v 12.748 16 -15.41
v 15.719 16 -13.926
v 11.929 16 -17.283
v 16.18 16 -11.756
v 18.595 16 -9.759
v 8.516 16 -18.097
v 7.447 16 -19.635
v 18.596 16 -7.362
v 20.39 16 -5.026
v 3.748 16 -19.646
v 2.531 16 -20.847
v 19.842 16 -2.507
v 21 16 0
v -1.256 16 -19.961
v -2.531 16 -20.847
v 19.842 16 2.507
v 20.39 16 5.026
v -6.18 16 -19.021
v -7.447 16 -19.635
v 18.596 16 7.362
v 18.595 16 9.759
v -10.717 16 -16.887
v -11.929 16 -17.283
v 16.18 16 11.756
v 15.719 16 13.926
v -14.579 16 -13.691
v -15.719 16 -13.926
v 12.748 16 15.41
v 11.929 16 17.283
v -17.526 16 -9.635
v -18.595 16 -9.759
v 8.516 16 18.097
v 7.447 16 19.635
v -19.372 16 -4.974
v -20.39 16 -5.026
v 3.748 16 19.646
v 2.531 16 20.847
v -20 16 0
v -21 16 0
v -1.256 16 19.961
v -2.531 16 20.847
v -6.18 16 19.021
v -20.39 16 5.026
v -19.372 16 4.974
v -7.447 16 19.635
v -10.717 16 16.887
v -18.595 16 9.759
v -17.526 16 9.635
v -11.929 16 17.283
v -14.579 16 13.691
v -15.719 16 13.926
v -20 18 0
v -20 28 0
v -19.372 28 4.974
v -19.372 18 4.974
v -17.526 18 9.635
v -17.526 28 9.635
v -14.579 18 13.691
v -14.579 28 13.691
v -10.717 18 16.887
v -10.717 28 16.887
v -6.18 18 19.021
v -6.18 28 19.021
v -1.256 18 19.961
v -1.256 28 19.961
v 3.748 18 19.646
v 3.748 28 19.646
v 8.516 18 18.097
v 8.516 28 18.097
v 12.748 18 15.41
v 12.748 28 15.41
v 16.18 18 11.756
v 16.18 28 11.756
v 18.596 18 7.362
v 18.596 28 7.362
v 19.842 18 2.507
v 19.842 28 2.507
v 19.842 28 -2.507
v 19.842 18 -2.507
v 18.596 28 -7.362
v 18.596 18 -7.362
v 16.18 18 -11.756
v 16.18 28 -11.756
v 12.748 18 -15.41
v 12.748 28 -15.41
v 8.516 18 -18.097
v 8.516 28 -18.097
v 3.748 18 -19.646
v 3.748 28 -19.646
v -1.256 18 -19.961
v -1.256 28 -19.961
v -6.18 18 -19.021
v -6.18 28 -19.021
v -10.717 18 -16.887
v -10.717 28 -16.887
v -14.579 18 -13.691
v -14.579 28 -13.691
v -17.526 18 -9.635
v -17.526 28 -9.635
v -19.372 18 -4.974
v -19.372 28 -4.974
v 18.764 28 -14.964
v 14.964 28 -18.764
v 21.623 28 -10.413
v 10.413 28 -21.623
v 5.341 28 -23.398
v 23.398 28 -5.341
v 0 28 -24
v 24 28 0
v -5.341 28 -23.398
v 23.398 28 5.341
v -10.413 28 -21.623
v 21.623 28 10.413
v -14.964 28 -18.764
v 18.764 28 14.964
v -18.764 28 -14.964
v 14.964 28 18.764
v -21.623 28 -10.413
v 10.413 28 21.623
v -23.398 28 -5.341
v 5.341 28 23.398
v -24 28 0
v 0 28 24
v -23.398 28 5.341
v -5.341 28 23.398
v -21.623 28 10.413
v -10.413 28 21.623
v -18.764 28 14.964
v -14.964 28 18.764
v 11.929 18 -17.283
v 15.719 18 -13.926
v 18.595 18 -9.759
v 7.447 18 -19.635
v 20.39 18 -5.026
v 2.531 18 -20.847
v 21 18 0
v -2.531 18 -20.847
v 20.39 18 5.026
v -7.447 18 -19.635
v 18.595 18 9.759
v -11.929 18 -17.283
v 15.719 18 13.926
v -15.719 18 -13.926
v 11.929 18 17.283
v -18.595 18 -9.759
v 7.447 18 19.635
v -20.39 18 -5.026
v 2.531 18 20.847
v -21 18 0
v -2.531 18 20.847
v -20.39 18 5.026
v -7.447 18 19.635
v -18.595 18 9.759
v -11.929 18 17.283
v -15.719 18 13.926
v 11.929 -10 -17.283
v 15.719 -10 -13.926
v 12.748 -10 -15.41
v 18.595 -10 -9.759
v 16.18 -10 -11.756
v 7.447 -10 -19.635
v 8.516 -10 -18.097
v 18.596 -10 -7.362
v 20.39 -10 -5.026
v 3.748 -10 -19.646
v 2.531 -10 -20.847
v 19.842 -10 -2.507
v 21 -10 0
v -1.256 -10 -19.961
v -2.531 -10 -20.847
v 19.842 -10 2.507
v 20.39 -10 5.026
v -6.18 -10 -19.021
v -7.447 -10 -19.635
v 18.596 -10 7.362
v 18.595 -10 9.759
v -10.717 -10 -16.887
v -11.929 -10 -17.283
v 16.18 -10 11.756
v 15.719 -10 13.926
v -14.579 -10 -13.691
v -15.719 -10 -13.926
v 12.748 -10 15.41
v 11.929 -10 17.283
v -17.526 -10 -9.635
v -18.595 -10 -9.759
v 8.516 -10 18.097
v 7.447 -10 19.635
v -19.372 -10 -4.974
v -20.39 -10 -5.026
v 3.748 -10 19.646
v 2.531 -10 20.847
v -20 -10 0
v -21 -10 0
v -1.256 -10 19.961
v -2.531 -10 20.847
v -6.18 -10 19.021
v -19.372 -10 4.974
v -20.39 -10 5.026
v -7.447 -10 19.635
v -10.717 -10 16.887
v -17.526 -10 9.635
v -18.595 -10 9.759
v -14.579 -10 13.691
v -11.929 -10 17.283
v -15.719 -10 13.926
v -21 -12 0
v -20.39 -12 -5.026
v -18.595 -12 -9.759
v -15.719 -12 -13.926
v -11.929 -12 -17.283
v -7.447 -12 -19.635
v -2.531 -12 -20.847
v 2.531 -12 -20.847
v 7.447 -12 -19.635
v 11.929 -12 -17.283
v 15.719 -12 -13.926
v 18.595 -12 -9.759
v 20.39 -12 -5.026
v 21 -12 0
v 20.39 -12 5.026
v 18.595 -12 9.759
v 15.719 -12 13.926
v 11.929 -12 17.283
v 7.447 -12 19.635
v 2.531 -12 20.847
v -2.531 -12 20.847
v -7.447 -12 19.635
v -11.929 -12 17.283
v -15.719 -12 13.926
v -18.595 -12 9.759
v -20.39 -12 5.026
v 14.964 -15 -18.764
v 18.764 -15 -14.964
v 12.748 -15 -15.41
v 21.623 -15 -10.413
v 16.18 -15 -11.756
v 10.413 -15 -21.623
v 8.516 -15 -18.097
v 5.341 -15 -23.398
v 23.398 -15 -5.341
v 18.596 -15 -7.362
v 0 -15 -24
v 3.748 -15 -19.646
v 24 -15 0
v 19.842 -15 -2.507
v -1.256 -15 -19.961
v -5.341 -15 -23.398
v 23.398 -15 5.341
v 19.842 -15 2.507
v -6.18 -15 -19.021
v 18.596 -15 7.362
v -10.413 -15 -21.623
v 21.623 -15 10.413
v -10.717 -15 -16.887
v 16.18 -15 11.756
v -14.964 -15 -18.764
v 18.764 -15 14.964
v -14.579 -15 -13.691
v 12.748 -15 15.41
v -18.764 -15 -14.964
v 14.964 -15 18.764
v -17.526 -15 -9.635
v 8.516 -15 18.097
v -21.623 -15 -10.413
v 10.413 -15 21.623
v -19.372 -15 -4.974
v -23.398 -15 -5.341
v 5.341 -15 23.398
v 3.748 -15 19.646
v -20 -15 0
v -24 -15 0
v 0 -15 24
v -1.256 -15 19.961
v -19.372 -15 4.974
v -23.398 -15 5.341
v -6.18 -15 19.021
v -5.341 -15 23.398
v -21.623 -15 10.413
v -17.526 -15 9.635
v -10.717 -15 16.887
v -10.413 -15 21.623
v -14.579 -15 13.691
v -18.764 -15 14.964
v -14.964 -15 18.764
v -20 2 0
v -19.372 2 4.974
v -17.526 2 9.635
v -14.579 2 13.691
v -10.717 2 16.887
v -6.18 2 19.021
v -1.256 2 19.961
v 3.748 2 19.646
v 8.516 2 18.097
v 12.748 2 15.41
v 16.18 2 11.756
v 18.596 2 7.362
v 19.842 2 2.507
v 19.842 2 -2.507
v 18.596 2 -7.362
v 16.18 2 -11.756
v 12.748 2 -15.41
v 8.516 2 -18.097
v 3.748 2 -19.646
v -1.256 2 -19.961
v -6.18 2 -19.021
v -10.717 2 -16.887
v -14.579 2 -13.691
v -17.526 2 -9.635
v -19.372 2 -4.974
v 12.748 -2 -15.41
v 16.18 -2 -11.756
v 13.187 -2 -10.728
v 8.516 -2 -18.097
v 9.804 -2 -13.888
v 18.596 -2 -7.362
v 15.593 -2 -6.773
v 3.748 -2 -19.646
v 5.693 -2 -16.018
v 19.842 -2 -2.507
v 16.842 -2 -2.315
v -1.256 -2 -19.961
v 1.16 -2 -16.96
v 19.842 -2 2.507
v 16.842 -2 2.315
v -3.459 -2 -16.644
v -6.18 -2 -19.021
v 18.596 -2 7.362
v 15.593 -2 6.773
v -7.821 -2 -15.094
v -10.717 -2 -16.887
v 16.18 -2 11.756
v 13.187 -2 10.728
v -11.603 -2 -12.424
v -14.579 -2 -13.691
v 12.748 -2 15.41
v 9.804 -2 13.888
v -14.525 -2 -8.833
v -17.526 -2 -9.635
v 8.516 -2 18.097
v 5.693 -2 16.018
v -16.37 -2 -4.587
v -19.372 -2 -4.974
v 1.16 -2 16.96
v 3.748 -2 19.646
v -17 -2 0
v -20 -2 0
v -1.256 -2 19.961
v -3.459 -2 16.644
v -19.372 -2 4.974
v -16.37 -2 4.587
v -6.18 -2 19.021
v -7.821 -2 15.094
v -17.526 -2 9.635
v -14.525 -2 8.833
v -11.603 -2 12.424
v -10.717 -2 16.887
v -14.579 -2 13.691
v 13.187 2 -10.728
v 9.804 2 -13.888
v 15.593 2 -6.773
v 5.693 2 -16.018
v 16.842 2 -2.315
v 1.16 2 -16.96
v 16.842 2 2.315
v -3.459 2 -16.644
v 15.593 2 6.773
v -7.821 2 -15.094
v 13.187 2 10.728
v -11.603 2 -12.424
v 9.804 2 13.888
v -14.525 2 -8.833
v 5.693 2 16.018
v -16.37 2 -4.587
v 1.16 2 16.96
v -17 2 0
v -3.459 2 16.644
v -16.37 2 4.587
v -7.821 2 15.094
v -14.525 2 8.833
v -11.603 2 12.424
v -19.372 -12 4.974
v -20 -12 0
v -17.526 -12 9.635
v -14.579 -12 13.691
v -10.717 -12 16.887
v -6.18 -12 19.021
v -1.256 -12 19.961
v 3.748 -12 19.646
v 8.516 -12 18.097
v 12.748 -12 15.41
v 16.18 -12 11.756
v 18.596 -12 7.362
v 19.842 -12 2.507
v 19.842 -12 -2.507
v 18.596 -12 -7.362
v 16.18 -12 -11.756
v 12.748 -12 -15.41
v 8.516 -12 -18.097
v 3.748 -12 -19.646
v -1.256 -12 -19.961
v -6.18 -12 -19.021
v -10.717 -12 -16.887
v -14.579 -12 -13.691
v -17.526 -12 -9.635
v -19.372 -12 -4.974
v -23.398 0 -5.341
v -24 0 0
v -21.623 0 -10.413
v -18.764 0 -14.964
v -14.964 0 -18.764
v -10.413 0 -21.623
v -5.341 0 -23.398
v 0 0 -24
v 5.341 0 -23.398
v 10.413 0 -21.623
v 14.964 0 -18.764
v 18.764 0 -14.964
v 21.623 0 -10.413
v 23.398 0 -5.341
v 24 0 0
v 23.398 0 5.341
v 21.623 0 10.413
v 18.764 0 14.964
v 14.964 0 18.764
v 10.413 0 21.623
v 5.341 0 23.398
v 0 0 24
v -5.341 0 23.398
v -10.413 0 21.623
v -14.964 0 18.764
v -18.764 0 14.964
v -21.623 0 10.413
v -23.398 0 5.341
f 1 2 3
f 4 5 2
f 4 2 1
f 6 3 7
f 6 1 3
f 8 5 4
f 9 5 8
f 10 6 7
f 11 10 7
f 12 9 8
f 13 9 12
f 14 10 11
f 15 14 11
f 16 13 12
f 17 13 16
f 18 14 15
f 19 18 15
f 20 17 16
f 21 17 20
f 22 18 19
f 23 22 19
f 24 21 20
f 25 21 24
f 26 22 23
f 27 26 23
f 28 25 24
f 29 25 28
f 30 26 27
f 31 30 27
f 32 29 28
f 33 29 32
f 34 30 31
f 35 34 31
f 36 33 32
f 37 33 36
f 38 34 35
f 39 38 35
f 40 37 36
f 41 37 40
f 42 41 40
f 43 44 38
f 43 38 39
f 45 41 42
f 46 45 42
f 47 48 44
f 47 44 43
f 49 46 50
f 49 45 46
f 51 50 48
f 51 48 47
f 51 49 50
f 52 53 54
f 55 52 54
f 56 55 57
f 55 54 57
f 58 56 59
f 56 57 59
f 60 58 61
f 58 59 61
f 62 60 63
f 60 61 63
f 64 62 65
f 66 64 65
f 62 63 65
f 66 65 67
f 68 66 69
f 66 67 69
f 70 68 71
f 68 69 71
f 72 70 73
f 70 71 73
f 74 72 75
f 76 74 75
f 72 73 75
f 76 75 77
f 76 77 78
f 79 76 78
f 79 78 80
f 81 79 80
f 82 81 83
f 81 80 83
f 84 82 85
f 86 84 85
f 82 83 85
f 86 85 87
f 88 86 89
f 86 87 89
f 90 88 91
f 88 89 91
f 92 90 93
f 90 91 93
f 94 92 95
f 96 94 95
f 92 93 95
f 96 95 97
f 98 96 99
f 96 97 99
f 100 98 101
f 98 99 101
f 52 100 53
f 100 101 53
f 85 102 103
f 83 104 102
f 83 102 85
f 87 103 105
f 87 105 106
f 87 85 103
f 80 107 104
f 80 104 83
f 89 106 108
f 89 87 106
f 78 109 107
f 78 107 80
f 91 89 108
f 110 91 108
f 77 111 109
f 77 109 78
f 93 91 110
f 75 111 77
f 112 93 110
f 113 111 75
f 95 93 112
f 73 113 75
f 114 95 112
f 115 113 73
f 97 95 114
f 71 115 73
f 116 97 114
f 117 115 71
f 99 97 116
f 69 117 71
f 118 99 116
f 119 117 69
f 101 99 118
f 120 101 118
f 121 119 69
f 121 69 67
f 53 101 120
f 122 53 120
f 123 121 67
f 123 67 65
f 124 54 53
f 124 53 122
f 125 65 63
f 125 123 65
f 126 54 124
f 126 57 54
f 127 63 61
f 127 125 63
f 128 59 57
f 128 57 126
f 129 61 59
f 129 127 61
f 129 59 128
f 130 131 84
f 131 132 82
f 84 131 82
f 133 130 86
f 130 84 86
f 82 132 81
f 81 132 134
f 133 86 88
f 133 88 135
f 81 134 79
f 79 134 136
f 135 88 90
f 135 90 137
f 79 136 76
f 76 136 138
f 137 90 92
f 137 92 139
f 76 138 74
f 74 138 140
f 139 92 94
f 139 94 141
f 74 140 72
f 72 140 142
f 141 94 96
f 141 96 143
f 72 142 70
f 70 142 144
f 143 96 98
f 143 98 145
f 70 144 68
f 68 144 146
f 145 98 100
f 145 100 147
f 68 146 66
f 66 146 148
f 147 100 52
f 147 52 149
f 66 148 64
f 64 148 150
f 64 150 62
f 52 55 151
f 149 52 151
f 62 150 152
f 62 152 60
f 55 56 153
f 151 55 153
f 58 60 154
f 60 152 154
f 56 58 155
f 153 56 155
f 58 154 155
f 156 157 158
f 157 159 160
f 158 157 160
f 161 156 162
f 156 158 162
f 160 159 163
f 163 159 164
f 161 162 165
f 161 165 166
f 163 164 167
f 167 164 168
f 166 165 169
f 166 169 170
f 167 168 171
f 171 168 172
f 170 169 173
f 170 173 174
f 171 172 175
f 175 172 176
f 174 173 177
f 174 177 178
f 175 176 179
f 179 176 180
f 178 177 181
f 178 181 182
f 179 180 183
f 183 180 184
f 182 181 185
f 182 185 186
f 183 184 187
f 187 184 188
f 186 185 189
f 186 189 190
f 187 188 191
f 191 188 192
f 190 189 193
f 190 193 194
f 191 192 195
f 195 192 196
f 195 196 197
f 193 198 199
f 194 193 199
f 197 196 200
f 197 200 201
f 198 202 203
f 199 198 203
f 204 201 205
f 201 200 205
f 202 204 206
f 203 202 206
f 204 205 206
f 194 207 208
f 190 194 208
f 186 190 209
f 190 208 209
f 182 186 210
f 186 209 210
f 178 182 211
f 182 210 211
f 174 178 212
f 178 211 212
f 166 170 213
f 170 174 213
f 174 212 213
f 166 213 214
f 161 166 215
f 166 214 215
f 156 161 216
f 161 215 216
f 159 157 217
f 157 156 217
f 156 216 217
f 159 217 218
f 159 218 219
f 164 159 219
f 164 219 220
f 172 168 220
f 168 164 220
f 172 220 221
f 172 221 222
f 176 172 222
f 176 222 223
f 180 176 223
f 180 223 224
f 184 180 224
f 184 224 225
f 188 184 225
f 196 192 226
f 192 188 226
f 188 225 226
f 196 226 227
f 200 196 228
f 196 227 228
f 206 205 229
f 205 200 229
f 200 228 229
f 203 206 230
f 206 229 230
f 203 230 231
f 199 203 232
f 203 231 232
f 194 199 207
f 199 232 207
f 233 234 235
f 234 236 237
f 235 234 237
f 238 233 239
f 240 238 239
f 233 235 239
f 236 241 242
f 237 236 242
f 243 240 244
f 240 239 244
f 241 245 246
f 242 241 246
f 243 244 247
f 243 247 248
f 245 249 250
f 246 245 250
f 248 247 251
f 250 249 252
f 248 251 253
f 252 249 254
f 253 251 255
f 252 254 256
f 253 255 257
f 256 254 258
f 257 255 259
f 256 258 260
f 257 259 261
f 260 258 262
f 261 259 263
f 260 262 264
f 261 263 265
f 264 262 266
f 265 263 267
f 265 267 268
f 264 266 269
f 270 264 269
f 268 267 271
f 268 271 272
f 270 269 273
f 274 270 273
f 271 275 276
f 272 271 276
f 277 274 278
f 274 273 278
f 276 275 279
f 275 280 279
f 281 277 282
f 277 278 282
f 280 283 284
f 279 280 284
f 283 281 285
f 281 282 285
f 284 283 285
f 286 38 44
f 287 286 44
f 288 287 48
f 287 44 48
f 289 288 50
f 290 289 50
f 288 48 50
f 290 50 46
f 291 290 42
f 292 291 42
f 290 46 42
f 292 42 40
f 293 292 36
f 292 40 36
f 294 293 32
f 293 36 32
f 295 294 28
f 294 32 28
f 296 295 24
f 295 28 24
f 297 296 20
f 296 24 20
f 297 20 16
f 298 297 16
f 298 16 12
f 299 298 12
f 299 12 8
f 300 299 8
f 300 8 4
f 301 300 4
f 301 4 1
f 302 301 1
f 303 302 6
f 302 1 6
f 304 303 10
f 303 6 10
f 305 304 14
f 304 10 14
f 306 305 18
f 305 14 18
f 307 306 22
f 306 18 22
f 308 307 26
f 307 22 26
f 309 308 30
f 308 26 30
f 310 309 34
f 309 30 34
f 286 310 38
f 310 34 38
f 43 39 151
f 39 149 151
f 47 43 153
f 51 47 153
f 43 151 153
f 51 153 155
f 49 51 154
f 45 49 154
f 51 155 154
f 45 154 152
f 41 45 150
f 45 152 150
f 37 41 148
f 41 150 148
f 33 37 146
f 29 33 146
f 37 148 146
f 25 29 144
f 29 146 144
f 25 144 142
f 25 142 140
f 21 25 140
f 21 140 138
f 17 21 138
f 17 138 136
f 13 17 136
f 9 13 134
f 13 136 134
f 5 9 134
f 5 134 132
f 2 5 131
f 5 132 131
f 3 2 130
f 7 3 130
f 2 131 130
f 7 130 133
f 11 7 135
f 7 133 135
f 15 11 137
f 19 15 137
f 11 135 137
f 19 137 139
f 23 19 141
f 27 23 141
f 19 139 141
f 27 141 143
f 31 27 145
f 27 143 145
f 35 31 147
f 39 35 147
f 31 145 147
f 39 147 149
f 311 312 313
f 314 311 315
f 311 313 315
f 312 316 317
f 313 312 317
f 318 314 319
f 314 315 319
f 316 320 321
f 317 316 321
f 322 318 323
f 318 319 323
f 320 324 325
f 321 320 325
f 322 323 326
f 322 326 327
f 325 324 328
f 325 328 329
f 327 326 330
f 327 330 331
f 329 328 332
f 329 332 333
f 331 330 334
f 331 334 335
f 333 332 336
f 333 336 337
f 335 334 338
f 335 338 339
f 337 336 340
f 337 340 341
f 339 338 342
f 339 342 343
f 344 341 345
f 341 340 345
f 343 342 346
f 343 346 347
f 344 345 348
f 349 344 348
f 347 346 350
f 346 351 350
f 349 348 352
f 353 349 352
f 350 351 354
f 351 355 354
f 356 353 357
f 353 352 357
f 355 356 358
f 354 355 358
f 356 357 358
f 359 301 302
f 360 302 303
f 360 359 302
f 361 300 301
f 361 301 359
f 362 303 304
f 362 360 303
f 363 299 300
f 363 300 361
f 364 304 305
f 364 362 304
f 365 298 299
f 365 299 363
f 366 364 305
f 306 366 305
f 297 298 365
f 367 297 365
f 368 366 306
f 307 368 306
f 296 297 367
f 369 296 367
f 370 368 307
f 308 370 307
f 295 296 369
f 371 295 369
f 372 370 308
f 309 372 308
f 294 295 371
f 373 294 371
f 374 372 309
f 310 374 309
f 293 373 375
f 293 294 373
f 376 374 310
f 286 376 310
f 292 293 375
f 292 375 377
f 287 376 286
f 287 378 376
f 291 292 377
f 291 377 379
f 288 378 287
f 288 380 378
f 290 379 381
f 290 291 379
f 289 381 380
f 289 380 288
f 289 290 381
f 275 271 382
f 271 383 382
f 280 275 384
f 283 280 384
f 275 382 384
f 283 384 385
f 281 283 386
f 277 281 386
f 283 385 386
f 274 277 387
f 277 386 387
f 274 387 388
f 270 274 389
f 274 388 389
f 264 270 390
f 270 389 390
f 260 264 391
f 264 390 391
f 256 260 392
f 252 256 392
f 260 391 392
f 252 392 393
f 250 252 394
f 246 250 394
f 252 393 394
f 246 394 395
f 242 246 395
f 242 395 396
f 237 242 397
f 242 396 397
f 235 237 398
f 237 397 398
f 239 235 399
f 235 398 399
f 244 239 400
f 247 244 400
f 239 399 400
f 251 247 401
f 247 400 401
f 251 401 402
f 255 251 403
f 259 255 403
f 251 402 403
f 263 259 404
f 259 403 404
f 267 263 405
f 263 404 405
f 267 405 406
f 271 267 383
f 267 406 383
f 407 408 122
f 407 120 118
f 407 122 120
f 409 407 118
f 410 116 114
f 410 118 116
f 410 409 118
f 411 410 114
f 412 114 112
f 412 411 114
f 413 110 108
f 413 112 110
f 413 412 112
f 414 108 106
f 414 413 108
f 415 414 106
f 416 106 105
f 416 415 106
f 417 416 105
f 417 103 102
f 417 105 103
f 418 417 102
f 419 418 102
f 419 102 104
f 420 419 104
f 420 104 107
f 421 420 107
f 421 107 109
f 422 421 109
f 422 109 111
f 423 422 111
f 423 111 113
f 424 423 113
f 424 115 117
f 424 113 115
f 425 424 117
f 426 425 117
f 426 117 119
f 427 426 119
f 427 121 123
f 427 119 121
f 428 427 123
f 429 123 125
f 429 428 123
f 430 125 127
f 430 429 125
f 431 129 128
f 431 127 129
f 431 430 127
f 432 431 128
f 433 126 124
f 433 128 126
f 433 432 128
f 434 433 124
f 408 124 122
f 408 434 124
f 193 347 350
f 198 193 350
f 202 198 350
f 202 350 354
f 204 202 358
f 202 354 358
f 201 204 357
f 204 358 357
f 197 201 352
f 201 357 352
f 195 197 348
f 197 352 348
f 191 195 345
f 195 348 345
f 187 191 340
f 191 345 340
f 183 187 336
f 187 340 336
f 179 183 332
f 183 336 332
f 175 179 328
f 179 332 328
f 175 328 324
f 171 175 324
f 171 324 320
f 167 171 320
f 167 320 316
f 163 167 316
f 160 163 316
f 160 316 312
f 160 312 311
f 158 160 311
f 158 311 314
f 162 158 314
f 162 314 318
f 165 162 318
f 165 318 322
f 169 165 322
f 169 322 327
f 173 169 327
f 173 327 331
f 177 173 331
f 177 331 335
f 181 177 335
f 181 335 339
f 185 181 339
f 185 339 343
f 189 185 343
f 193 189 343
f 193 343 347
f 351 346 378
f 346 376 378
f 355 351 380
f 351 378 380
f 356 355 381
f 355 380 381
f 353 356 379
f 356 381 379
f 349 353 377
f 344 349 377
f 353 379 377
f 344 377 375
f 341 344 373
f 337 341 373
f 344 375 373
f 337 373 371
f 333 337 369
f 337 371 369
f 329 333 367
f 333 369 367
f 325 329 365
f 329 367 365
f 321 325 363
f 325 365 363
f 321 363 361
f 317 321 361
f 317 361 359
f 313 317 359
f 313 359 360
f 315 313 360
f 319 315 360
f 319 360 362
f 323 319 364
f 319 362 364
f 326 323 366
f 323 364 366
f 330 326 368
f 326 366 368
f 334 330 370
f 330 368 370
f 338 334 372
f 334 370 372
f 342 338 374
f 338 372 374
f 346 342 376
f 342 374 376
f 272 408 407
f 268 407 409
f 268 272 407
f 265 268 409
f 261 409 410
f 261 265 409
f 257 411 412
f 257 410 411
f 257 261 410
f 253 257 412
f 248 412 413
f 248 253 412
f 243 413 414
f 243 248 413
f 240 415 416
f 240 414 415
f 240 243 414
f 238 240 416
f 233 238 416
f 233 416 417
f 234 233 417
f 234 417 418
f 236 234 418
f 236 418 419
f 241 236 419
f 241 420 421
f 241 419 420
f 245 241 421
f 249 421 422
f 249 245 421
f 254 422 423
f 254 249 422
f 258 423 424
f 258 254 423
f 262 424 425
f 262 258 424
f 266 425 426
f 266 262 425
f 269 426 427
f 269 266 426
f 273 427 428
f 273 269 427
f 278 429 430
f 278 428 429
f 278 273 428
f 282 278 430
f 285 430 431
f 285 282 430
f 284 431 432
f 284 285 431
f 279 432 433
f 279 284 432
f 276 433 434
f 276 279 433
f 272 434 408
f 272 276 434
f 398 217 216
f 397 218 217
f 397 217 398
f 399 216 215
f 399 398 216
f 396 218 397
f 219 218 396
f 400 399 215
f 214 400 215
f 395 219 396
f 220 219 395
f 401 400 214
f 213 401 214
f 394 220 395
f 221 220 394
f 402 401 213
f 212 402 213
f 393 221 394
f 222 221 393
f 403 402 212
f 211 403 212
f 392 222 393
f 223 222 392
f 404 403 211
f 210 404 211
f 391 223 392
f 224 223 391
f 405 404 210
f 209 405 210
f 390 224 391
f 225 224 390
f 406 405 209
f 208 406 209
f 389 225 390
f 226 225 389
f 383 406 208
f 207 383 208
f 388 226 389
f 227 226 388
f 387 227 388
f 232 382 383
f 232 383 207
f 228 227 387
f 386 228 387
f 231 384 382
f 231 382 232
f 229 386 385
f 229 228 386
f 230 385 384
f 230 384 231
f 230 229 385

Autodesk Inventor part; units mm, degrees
ref_plane "YZ Plane" through (0, 0, 0) normal (1, 0, 0) x (0, 1, 0)
ref_plane "XZ Plane" through (0, 0, 0) normal (0, 1, 0) x (-1, 0, 0)
ref_plane "XY Plane" through (0, 0, 0) normal (0, 0, 1) x (1, 0, 0)
sketch "Sketch6" plane through (0, 0, 0) normal (0, 0, 1) x (1, 0, 0)
  line L0 (20, 28) -> (24, 28)
  line L1 (24, 28) -> (24, 0)
  line L2 (24, -15) -> (20, -15)
  line L3 (20, -15) -> (20, -12)
  line L4 (17, 2) -> (20, 2)
  line L5 (20, 2) -> (20, -2) construction
  line L6 (20, -2) -> (17, -2)
  line L7 (17, -2) -> (17, 2)
  line L8 (20, -10) -> (21, -10)
  line L9 (21, -10) -> (21, -12)
  line L10 (21, -12) -> (20, -12)
  line L11 (20, -12) -> (20, -10) construction
  line L12 (20, 2) -> (20, 16)
  line L13 (20, -2) -> (20, 2) construction
  line L14 (20, -10) -> (20, -2)
  line L15 (20, -12) -> (20, -10) construction
  line L16 (0, 0) -> (0, 29.8024)
  line L17 (20, 16) -> (21, 16)
  line L18 (21, 16) -> (21, 18)
  line L19 (21, 18) -> (20, 18)
  line L20 (17, 0) -> (24, 0) construction
  line L21 (24, 0) -> (24, -15)
  line L22 (20, 18) -> (20, 28)
  line L23 (20, 16) -> (20, 18) construction
  point P0 (20, 0)
  point P1 (20, -11)
  point P2 (20.5, -10)
  dimension "d15" = 4
  dimension "d16" = 3
  dimension "d17" = 8
  dimension "d18" = 2
  dimension "d19" = 1
  dimension "d21" = 48
  dimension "d22" = 40
  dimension "d24" = 14
  dimension "d25" = 15
  dimension "d26" = 2
  dimension "d27" = 1
  dimension "d28" = 28
revolve "Revolution1" add sketch "Sketch6" angle 360 mid plane about axis through (0, 0, 0) along (0, 1, 0)
equation "\"d26\" = d18"
equation "\"d27\" = d19"
properties part number "Седло для подшипника"
